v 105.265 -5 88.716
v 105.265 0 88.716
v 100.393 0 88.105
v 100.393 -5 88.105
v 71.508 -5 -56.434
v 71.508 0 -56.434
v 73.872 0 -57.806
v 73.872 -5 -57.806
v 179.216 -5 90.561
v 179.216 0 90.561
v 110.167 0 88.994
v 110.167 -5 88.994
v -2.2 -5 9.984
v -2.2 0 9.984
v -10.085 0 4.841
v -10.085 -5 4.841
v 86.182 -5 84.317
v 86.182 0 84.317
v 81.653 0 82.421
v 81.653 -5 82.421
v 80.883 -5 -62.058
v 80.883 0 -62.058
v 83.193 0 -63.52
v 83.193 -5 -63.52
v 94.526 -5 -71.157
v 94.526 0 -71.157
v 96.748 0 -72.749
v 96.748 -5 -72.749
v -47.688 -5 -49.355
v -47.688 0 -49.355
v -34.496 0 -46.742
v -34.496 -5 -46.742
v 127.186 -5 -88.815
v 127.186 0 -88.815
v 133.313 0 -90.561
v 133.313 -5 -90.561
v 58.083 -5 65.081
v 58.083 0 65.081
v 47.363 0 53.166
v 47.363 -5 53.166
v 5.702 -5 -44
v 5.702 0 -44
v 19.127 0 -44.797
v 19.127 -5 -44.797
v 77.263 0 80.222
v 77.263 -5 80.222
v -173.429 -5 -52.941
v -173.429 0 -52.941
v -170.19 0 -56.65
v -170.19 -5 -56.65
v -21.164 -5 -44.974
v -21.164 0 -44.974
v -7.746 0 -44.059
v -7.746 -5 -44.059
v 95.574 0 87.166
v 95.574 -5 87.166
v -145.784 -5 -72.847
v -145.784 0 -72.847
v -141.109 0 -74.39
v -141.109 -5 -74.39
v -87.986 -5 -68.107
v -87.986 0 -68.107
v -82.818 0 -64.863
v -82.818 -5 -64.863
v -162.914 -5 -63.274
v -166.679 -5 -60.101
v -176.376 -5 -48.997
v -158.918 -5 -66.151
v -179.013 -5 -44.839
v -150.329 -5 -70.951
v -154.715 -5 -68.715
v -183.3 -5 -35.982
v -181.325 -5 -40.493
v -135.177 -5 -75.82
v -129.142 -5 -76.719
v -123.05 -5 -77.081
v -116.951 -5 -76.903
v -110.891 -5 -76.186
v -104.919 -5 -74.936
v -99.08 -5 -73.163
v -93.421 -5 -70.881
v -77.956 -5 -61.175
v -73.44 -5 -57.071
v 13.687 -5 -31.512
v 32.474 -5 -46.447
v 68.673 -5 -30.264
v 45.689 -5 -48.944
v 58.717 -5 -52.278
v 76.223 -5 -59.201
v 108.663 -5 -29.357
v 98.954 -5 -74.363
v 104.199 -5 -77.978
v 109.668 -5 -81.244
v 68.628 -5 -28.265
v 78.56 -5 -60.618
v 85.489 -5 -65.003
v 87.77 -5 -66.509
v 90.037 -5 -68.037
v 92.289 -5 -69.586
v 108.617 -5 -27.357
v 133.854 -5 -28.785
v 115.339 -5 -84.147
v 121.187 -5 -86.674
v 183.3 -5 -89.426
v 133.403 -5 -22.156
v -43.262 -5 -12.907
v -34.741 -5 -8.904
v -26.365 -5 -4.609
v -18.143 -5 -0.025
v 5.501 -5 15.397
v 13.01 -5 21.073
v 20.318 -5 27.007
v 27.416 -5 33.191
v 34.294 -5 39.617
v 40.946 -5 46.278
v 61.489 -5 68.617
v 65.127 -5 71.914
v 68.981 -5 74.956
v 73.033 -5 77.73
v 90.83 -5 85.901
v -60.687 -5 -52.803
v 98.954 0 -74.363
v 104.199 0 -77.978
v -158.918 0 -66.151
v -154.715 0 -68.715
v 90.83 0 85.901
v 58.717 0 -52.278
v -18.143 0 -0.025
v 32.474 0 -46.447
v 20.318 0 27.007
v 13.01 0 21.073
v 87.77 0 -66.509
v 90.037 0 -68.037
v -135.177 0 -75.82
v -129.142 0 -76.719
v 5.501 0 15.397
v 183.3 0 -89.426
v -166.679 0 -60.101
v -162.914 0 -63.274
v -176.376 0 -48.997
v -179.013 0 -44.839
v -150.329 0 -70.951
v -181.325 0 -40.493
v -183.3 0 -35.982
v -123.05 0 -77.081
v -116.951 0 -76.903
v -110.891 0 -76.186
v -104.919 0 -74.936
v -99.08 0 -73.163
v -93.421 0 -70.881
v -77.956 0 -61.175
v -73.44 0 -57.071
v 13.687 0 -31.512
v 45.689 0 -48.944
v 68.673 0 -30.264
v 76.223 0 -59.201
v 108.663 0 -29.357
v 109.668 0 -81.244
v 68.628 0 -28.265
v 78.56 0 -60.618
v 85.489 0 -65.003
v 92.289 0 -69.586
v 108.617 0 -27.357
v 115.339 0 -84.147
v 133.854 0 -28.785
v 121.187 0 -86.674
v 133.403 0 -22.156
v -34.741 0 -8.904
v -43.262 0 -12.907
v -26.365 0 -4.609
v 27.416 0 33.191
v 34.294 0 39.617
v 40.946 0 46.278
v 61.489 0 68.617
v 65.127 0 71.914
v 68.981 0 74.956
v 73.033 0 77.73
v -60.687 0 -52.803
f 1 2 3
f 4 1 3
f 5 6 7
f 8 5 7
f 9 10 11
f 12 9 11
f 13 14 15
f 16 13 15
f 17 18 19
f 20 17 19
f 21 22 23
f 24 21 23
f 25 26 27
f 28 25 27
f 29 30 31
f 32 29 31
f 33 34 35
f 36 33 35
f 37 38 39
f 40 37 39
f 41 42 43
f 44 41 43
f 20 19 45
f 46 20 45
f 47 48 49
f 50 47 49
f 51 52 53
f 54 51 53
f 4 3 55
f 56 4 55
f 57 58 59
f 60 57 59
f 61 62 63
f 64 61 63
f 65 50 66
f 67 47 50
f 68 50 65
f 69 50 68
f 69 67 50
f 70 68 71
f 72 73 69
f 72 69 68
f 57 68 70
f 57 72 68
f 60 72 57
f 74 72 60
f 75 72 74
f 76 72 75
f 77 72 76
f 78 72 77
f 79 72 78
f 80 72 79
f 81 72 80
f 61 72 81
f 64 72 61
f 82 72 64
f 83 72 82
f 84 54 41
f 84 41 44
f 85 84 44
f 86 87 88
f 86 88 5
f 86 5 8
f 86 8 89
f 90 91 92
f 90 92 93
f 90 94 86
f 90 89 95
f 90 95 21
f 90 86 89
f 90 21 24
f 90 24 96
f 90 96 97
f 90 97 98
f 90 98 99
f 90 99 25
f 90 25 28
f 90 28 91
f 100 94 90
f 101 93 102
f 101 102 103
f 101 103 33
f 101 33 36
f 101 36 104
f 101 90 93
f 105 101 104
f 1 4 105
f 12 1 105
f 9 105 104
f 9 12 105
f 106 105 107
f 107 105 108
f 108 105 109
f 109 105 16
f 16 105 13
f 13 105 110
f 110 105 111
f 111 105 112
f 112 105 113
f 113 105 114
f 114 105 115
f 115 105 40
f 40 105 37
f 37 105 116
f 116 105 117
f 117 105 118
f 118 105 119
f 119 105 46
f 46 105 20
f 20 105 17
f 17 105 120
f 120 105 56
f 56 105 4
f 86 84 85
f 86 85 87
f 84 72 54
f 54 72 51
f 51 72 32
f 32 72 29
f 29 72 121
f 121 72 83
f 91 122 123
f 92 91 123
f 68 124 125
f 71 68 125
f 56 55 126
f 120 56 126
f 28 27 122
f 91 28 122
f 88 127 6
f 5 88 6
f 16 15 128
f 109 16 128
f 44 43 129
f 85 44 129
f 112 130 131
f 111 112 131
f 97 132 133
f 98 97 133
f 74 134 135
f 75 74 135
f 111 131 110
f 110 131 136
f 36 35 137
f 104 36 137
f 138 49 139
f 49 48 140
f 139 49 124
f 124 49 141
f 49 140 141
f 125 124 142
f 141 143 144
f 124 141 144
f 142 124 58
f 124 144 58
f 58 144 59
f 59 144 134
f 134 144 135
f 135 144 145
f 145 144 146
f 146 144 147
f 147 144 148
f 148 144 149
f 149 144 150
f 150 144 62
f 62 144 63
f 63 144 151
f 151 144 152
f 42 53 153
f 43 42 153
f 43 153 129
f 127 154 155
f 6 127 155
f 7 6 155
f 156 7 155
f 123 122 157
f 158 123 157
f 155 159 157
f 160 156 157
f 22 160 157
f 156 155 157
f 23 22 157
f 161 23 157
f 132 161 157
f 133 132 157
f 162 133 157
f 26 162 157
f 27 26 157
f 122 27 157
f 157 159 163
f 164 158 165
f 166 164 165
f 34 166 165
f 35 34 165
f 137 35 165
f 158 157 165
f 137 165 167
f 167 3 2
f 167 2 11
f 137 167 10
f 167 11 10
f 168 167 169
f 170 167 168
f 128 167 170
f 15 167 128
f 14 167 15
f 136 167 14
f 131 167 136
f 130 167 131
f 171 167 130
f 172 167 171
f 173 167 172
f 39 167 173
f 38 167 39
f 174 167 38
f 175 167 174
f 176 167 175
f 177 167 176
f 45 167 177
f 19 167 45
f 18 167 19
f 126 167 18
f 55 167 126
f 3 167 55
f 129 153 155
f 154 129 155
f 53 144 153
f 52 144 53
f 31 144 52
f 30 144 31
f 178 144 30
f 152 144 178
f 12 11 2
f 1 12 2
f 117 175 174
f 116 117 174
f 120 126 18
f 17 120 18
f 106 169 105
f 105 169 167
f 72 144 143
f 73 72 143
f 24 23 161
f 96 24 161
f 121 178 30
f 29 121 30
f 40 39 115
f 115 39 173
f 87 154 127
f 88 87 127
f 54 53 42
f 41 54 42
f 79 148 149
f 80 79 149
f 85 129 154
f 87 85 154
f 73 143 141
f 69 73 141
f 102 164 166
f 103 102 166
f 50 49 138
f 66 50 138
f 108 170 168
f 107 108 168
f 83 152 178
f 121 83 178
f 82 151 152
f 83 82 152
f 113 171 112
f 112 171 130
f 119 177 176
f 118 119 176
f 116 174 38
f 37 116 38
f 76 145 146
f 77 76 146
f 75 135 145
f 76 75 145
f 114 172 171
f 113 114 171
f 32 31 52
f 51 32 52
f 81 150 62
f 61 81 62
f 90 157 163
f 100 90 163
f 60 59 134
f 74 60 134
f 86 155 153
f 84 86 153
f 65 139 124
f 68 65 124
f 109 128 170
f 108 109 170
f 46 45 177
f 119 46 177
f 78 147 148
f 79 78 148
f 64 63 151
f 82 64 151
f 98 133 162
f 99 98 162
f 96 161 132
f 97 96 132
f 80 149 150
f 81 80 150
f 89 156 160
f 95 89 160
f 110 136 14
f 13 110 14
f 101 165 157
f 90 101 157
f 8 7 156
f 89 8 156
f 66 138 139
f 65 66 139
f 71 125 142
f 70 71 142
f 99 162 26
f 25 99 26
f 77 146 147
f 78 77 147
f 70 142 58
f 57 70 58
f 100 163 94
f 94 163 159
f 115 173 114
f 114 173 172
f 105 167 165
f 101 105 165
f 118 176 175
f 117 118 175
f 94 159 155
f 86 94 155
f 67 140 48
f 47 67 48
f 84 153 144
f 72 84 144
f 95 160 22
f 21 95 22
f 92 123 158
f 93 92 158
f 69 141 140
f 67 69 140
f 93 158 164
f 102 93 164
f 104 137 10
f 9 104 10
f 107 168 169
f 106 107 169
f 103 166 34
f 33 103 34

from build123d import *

# Parameters (mm, degrees)
F1_DEPTH = 5


with BuildPart() as f1:
    # F0 (on Front) → F1 (new body)
    with BuildSketch(Plane.XZ):
        Polygon((98.954107, -74.362564), (104.19903, -77.978152), (109.668386, -81.244313), (115.338936, -84.147177), (121.18655, -86.674401), (127.186436, -88.81524), (133.313043, -90.560601), (183.300167, -89.426237), (179.215694, 90.560601), (110.167471, 88.993675), (105.265372, 88.715596), (100.393449, 88.10531), (95.574231, 87.165612), (90.829917, 85.900844), (86.182454, 84.316849), (81.653253, 82.420968), (77.263269, 80.221912), (73.032696, 77.729842), (68.981142, 74.956264), (65.127251, 71.913979), (61.488803, 68.617033), (58.082663, 65.080642), (47.36272, 53.16601), (40.946045, 46.278343), (34.294343, 39.617396), (27.415617, 33.191171), (20.31812, 27.007388), (13.010413, 21.073491), (5.501284, 15.396642), (-2.200199, 9.983673), (-10.084816, 4.841088), (-18.143068, -0.024943), (-26.365251, -4.608551), (-34.74146, -8.904199), (-43.26161, -12.906756), (133.402603, -22.155506), (133.854063, -28.785007), (108.662673, -29.356685), (108.617309, -27.357197), (68.6276, -28.264688), (68.672964, -30.264176), (13.68712, -31.511977), (-183.300167, -35.98225), (-181.325495, -40.492528), (-179.012799, -44.839153), (-176.375517, -48.996879), (-173.429016, -52.941474), (-170.190414, -56.650001), (-166.678559, -60.100921), (-162.913898, -63.274092), (-158.9183, -66.1511), (-154.715058, -68.715204), (-150.328605, -70.951446), (-145.784468, -72.846844), (-141.109065, -74.390402), (-135.176895, -75.819813), (-129.14155, -76.719024), (-123.050325, -77.080999), (-116.950947, -76.90292), (-110.891218, -76.186132), (-104.918612, -74.936274), (-99.079939, -73.163151), (-93.420946, -70.880656), (-87.985981, -68.106646), (-82.817589, -64.862913), (-77.956334, -61.174808), (-73.440239, -57.07126), (-60.687026, -52.802841), (-47.687916, -49.355121), (-34.495664, -46.742045), (-21.163813, -44.974281), (-7.746441, -44.058942), (5.701995, -43.999785), (19.126911, -44.79704), (32.473798, -46.447456), (45.688529, -48.944352), (58.717485, -52.277594), (71.507756, -56.433644), (73.871785, -57.805904), (76.22253, -59.200745), (78.559838, -60.618065), (80.88343, -62.057712), (83.193128, -63.519558), (85.488729, -65.003451), (87.769979, -66.50929), (90.036701, -68.036923), (92.28869, -69.586221), (94.525719, -71.157008), (96.747584, -72.749181), align=None)
    extrude(amount=F1_DEPTH)


solid = f1.part
